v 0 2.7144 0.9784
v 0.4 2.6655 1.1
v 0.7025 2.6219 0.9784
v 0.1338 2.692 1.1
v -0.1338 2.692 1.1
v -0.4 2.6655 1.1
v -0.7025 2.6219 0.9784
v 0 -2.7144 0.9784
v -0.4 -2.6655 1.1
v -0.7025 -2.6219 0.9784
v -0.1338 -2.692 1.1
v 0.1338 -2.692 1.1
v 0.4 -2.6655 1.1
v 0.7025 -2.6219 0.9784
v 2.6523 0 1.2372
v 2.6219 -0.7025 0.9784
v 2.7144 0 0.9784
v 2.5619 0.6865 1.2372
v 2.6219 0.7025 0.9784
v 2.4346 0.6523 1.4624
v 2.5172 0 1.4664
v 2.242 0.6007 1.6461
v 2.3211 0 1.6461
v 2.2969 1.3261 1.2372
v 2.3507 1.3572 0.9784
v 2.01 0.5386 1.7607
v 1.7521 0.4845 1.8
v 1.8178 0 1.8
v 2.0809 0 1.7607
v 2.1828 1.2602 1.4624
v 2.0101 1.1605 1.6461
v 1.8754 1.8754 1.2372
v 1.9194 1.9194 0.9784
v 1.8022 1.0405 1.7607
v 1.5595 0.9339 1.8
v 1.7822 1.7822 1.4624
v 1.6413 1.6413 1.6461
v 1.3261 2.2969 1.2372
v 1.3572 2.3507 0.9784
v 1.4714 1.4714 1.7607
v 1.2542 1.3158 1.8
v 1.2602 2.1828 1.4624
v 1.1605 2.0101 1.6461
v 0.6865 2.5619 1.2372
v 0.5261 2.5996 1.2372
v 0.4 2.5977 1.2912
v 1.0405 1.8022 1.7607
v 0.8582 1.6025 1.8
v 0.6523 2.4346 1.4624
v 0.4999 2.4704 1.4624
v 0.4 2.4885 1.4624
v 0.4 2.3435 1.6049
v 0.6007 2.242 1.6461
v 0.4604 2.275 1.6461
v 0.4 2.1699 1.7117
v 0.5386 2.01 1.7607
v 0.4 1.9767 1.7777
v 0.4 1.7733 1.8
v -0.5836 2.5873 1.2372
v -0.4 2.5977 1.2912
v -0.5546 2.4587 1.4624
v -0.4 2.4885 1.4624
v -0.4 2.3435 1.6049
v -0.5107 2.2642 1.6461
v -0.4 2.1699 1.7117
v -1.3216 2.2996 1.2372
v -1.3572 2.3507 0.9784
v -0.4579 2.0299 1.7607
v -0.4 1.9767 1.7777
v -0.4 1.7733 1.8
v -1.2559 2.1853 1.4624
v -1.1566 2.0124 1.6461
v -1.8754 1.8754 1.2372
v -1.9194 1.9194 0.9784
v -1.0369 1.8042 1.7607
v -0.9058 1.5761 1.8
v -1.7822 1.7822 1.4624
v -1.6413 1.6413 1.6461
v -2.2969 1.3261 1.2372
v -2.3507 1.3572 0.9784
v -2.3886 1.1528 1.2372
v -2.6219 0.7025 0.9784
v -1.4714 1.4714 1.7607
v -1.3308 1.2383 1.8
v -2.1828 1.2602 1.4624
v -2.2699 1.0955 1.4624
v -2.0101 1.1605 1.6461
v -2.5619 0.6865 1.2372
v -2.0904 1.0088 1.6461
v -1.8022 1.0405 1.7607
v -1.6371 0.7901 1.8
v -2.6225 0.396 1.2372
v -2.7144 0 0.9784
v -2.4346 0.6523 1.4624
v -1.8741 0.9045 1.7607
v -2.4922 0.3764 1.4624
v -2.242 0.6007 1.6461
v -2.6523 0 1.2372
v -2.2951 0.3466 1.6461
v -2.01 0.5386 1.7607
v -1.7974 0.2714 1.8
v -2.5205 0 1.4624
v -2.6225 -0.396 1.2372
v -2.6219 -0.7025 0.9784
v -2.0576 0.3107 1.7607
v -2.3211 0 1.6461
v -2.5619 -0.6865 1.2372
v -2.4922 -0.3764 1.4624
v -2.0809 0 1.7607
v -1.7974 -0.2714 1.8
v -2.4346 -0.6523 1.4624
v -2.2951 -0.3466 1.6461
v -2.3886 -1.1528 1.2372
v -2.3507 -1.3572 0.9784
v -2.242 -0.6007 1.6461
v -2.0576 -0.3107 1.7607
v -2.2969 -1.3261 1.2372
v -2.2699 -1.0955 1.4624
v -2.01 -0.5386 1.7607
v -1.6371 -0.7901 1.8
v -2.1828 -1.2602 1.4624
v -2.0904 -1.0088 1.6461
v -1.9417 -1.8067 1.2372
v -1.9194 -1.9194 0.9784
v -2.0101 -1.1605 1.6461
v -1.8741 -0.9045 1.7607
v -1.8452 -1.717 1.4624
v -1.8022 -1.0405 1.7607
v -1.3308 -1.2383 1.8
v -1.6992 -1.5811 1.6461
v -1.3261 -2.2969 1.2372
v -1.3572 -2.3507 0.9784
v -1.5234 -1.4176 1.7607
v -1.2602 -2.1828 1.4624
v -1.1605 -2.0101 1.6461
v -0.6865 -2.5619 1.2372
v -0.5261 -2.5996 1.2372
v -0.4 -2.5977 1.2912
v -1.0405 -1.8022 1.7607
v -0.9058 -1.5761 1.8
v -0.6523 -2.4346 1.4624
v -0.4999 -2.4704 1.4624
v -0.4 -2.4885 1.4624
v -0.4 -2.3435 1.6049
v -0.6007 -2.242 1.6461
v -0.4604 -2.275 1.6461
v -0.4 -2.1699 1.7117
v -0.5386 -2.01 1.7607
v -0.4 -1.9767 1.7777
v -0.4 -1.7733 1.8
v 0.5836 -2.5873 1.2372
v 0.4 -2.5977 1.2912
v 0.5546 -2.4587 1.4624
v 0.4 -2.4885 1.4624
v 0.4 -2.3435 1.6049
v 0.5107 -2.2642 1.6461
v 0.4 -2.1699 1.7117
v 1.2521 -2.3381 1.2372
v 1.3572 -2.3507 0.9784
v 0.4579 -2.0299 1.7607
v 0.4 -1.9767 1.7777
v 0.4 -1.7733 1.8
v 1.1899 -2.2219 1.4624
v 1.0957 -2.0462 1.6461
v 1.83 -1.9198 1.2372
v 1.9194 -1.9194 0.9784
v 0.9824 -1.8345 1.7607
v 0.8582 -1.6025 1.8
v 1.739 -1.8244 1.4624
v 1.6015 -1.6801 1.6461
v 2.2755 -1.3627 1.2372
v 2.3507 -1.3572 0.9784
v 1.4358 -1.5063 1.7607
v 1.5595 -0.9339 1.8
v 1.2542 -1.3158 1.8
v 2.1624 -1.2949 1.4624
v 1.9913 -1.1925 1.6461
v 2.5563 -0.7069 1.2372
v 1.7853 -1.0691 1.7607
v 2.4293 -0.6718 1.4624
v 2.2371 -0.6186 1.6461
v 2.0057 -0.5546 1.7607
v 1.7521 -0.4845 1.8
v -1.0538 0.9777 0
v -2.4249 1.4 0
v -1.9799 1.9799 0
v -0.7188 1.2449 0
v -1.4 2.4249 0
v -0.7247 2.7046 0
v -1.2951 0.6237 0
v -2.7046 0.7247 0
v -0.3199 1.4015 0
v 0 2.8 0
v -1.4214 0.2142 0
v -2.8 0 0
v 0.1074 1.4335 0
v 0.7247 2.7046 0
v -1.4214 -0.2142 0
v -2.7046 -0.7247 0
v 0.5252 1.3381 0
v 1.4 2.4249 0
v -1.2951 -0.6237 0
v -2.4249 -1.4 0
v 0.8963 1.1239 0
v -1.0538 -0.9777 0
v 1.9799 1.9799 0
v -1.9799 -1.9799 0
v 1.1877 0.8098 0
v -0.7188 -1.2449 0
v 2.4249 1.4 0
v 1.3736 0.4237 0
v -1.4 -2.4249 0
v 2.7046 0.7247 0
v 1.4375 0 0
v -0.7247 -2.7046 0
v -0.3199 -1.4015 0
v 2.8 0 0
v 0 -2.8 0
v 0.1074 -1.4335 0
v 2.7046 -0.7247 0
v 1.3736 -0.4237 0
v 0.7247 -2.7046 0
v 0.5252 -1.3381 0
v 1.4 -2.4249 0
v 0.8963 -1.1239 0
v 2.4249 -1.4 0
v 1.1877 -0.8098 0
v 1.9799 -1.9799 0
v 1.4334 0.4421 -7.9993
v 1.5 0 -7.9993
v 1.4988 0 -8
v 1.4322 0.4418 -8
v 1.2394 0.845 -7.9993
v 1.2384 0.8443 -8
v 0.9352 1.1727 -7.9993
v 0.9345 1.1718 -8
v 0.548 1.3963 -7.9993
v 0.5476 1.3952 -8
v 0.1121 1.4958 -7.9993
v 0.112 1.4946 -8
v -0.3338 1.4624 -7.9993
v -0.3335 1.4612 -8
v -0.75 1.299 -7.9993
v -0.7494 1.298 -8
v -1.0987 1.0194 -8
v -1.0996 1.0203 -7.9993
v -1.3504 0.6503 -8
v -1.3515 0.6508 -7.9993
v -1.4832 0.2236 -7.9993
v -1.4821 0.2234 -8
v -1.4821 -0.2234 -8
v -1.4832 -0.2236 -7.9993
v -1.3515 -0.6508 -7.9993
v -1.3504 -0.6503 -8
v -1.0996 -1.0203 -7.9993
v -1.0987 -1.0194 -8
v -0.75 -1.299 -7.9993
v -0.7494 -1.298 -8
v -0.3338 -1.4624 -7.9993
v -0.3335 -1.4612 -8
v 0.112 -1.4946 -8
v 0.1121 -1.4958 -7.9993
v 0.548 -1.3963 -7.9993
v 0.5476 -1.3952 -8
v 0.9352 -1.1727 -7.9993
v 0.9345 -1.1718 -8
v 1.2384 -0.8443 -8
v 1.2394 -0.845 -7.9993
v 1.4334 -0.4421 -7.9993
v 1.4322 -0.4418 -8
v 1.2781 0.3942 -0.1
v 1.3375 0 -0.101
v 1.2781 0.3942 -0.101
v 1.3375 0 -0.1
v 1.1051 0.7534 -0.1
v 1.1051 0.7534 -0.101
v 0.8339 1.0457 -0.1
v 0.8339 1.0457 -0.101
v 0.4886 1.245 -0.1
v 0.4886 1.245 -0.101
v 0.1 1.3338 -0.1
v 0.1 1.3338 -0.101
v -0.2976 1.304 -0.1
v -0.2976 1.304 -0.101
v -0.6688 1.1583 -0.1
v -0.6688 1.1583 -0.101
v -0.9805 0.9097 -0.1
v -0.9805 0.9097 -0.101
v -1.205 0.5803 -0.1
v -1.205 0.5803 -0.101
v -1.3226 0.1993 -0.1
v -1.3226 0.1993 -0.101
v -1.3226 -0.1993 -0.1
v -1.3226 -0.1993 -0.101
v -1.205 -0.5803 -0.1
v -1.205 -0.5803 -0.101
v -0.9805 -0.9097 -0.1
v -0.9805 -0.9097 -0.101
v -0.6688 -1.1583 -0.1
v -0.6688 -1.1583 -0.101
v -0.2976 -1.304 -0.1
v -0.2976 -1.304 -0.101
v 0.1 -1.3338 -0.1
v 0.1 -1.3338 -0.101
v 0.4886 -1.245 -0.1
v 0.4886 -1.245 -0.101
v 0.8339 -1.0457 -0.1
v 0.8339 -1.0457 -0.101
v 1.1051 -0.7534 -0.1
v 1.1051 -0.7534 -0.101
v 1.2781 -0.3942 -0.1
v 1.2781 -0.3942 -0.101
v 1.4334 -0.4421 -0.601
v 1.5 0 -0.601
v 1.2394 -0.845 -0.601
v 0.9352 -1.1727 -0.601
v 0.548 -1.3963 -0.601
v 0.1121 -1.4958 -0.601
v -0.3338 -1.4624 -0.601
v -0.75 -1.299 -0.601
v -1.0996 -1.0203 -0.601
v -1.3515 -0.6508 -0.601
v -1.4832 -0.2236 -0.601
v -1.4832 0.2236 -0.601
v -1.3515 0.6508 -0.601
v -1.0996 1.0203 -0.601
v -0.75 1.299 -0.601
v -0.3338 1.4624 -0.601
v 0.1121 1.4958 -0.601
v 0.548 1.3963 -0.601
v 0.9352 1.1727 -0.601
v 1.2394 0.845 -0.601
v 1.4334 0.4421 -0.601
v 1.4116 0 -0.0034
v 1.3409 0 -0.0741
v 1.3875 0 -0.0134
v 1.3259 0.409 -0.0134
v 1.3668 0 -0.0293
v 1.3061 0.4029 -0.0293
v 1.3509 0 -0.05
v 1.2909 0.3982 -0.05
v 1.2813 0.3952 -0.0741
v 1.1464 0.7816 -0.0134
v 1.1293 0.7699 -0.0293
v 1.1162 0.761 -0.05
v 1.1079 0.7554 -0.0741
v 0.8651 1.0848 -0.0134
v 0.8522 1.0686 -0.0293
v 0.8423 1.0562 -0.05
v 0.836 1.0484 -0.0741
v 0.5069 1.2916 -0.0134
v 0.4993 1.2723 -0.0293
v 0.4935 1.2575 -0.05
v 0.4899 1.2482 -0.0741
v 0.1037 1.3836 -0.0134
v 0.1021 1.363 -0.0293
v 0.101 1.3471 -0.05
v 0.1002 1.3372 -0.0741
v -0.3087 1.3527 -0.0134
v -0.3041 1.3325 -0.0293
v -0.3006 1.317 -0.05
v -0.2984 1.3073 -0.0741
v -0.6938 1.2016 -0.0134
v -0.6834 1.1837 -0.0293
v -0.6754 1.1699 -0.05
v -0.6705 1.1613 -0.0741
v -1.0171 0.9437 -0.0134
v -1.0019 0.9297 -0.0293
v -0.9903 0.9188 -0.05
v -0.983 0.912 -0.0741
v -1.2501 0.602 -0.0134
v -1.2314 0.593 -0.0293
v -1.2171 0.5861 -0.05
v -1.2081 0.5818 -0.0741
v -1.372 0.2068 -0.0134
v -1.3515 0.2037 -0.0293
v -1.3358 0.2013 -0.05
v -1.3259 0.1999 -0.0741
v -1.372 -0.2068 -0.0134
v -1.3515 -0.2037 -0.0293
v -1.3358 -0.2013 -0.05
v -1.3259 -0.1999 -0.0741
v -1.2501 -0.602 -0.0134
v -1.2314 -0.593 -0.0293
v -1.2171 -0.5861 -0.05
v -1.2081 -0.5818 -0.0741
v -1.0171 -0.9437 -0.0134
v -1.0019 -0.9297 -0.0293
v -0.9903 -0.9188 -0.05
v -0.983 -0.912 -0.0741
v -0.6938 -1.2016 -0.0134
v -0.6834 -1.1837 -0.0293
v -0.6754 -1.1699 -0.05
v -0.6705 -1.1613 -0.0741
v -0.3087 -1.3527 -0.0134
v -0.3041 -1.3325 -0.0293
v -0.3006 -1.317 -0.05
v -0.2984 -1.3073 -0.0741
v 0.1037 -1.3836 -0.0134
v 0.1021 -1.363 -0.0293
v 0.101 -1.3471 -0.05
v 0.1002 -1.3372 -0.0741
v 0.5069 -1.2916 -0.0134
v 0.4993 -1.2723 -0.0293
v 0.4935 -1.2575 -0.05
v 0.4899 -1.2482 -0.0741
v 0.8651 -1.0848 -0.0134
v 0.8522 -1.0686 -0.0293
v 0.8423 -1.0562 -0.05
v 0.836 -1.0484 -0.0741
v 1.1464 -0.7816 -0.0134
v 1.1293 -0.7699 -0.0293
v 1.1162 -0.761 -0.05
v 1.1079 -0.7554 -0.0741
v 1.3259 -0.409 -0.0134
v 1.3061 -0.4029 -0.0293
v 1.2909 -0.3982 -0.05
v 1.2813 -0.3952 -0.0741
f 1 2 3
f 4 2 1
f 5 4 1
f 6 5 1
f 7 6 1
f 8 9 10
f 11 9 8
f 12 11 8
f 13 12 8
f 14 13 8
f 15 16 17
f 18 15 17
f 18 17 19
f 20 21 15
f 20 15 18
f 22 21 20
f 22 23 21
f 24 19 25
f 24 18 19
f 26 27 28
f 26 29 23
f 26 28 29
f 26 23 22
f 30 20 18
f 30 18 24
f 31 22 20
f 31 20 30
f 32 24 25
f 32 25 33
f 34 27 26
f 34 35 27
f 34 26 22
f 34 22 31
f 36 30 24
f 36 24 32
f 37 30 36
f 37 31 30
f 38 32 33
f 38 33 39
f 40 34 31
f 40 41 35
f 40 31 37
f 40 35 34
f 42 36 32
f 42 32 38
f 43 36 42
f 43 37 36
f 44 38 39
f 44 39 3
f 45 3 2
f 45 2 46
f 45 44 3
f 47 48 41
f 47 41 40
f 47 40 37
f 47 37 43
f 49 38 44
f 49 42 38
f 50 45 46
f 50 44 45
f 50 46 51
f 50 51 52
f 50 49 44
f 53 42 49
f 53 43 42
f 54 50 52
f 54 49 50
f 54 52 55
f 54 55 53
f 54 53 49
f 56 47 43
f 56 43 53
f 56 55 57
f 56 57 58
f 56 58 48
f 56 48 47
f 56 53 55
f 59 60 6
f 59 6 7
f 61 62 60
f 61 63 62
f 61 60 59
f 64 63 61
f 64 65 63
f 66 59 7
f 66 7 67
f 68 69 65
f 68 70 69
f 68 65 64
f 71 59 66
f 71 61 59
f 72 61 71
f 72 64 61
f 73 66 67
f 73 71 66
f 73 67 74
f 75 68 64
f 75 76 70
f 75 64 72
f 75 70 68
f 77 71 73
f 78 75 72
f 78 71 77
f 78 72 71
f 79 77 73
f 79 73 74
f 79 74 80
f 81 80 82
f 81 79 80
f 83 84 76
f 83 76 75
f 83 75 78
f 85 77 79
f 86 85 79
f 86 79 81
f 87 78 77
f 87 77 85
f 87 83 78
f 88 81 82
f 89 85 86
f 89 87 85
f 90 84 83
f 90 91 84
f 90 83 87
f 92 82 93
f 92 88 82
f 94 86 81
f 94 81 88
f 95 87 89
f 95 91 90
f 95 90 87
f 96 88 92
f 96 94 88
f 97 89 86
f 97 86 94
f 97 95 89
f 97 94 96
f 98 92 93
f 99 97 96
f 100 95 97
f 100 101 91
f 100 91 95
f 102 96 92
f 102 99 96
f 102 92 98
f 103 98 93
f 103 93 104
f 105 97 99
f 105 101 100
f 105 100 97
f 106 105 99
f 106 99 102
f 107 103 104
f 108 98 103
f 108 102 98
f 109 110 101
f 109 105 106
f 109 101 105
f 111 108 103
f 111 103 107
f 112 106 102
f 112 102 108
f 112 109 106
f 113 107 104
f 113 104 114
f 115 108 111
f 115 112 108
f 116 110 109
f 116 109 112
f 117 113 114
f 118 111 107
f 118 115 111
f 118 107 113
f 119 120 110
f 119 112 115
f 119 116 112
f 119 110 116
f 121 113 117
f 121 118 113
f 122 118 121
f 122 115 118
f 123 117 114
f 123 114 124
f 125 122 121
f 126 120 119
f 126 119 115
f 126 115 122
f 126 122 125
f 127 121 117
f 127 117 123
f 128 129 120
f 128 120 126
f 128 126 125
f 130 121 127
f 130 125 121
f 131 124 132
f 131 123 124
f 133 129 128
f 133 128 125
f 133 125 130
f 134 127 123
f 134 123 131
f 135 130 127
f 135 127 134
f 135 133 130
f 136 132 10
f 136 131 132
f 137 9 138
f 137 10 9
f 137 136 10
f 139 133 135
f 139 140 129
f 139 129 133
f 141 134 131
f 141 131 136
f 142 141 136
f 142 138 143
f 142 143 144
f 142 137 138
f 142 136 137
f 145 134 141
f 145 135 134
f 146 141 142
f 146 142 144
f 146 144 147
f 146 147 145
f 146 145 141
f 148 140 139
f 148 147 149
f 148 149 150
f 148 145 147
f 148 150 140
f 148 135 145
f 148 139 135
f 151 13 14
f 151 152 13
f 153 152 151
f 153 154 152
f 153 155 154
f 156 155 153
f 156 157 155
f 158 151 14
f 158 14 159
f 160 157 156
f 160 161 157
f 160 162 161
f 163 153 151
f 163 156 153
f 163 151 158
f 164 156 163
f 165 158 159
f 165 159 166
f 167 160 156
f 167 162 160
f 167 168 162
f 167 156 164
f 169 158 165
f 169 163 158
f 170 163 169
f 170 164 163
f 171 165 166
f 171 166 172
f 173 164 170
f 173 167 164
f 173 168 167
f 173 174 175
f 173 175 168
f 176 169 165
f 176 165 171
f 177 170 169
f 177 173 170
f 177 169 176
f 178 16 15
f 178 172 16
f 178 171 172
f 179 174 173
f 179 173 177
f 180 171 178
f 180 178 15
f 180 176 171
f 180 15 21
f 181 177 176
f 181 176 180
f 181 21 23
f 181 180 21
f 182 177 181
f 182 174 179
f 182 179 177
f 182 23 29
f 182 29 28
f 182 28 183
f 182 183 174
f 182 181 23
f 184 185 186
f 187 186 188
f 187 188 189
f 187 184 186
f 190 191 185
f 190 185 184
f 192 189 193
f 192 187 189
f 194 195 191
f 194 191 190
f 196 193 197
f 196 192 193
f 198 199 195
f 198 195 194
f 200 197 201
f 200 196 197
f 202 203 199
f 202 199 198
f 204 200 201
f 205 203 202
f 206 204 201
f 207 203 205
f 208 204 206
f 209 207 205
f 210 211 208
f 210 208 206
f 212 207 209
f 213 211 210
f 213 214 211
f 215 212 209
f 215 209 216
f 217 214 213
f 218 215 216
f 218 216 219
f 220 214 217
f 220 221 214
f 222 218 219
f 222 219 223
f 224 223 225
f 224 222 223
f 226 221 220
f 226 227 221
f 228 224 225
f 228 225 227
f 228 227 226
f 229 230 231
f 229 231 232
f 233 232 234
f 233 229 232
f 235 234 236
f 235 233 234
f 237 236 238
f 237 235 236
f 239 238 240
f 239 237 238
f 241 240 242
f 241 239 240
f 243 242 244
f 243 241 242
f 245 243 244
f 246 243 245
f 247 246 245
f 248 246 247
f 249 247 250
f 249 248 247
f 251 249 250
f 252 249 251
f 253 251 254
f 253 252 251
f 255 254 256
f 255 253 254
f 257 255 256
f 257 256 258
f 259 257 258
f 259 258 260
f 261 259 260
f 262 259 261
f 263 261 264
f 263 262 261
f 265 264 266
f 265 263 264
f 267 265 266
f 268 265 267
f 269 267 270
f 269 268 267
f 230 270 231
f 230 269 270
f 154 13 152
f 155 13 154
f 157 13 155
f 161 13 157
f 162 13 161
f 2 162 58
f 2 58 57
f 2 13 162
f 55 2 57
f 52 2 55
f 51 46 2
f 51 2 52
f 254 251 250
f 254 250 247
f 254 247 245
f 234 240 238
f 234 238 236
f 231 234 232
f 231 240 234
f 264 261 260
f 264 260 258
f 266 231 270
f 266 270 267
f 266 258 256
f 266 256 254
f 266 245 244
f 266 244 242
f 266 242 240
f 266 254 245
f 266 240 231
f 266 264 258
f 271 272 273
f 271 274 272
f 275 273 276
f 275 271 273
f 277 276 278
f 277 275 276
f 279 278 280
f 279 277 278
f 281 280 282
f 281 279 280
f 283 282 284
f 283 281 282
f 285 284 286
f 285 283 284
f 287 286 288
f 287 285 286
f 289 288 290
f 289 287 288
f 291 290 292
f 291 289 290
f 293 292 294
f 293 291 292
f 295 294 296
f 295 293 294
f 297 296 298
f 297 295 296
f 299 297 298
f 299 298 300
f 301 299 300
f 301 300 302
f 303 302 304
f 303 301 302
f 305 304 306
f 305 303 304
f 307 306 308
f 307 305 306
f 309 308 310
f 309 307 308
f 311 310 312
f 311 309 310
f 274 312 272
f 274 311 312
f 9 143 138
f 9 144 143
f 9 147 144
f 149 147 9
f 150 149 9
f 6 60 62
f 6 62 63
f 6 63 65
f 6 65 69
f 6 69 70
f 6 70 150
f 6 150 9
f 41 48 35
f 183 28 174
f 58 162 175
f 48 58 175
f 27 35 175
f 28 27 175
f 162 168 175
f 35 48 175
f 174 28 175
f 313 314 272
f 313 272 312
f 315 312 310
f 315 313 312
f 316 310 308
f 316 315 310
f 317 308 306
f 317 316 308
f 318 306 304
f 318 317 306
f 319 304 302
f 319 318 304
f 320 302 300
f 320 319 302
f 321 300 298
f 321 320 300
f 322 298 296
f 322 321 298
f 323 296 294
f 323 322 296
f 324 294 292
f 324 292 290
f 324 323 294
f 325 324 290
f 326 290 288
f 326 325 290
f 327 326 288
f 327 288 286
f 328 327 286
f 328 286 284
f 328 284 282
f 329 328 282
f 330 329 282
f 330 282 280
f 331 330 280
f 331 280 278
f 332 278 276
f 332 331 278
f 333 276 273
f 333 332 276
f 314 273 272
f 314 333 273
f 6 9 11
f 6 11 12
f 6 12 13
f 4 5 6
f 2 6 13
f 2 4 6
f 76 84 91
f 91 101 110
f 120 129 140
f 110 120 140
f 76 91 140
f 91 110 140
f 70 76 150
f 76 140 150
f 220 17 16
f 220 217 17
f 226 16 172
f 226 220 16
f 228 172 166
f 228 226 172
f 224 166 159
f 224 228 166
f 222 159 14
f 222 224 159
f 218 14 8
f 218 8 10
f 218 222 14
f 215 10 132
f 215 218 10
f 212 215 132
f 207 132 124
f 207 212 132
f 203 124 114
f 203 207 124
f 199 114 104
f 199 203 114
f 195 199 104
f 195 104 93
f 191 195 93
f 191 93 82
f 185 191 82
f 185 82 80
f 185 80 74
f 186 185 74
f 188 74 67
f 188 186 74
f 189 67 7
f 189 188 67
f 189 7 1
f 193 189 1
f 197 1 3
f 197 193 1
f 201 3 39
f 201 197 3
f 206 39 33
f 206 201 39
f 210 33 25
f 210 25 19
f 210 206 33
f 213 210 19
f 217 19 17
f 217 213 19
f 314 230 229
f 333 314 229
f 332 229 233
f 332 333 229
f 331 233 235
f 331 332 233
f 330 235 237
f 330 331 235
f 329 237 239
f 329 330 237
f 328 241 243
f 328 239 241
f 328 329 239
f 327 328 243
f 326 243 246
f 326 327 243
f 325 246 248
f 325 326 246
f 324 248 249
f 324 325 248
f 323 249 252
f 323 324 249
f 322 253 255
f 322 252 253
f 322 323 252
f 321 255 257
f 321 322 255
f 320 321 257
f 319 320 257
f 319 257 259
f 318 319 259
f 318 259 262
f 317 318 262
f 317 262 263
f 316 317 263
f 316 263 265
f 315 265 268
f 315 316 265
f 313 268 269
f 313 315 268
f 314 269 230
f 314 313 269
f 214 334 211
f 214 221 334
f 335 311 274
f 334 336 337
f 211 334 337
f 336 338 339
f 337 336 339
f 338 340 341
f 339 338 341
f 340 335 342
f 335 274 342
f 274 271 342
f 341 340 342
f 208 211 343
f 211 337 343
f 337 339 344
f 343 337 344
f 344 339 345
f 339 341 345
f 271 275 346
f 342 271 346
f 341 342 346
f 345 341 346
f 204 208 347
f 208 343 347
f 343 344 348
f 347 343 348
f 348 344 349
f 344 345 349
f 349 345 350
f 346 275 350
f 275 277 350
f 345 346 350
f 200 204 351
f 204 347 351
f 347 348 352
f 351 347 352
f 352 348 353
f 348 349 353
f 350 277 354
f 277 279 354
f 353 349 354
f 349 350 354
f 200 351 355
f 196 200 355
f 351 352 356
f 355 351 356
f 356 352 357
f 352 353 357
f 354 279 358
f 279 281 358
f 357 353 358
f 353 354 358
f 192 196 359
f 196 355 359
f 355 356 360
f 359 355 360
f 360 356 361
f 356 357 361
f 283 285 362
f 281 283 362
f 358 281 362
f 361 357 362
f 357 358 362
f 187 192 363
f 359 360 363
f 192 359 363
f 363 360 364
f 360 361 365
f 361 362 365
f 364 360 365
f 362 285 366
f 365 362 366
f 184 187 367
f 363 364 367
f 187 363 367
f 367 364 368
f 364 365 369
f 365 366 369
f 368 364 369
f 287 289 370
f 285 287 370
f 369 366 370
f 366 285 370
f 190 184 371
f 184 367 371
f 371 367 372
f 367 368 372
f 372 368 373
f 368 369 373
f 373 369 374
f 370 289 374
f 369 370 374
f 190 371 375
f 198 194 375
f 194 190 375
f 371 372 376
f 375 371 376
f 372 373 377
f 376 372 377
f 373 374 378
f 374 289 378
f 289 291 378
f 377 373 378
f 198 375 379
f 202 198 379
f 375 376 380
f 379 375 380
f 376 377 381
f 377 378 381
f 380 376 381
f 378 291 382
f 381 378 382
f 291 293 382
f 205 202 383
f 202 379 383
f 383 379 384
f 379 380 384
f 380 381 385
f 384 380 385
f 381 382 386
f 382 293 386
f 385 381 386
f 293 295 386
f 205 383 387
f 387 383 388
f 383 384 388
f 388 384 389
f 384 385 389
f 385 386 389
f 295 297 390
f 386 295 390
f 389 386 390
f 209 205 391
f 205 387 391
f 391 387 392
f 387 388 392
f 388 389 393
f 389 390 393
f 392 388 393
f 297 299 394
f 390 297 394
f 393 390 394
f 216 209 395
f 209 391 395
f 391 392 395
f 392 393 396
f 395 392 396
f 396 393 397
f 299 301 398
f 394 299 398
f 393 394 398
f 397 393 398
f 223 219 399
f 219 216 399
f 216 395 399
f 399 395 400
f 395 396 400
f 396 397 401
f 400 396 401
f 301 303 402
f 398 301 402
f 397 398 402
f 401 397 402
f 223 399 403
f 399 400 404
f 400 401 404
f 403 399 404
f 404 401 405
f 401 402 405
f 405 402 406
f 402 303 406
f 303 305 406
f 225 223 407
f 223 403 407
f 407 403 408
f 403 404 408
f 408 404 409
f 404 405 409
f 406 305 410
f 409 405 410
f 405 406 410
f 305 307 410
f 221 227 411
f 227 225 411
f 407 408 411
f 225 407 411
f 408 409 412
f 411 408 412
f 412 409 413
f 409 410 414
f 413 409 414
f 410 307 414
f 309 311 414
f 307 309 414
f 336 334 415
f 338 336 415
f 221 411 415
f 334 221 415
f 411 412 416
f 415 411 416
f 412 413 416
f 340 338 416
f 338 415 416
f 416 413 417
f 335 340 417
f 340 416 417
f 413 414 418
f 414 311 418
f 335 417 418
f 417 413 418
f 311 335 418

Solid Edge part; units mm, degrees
sketch "Sketch1" plane through (0, 0, 0) normal (0, -1, 0) x (1, 0, 0)
  line L0 (0, -8) -> (1.5, -8)
  line L1 (1.5, -8) -> (1.5, -0.601)
  line L2 (1.5, -0.601) -> (1.3375, -0.101)
  line L3 (1.3375, -0.101) -> (1.3375, 0)
  line L4 (1.3375, 0) -> (2.8, 0)
  line L5 (2.8, 0) -> (2.6425, 1.8)
  line L6 (2.6425, 1.8) -> (0, 1.8)
  dimension "D1" = 1.5
  dimension "D2" = 1.3375
  dimension "D3" = 8
  dimension "D4" = 7.399
  dimension "D5" = 0.5
  dimension "D6" = 2.8
  dimension "D7" = 1.8
revolve "RevolvedProtrusion1" add sketch "Sketch1" angle 360 about axis through (0, 0, 6) along (0, 0, -1)
fillet "Round_1" radius 0.9 1 edges at (-2.6425, 0, 1.8)
sketch "Sketch2" plane through (0, 0, 0) normal (0, -1, 0) x (1, 0, 0)
  line L0 (-0.4, 1.8) -> (-0.4, 1.1)
  line L1 (-0.4, 1.1) -> (0.4, 1.1)
  line L2 (0.4, 1.1) -> (0.4, 1.8)
  line L3 (0.4, 1.8) -> (-0.4, 1.8)
  dimension "D1" = 0.8
  dimension "D2" = 0.7
  dimension "D3" = 1.8
extrude "ExtrudedCutout_1" cut sketch "Sketch2" along normal mid plane 5.6
cosmetic_thread "Thread_1" size "M3" thread depth 7.399
fillet "Round_2" radius 0.1 1 edges at (-1.3375, 0, 0)
chamfer "Chamfer_1" distance 0.0012 angle 30 1 edges at (-1.5, 0, -8) measured on face at (1.03, 0.97, -8)
properties material "Steel"
